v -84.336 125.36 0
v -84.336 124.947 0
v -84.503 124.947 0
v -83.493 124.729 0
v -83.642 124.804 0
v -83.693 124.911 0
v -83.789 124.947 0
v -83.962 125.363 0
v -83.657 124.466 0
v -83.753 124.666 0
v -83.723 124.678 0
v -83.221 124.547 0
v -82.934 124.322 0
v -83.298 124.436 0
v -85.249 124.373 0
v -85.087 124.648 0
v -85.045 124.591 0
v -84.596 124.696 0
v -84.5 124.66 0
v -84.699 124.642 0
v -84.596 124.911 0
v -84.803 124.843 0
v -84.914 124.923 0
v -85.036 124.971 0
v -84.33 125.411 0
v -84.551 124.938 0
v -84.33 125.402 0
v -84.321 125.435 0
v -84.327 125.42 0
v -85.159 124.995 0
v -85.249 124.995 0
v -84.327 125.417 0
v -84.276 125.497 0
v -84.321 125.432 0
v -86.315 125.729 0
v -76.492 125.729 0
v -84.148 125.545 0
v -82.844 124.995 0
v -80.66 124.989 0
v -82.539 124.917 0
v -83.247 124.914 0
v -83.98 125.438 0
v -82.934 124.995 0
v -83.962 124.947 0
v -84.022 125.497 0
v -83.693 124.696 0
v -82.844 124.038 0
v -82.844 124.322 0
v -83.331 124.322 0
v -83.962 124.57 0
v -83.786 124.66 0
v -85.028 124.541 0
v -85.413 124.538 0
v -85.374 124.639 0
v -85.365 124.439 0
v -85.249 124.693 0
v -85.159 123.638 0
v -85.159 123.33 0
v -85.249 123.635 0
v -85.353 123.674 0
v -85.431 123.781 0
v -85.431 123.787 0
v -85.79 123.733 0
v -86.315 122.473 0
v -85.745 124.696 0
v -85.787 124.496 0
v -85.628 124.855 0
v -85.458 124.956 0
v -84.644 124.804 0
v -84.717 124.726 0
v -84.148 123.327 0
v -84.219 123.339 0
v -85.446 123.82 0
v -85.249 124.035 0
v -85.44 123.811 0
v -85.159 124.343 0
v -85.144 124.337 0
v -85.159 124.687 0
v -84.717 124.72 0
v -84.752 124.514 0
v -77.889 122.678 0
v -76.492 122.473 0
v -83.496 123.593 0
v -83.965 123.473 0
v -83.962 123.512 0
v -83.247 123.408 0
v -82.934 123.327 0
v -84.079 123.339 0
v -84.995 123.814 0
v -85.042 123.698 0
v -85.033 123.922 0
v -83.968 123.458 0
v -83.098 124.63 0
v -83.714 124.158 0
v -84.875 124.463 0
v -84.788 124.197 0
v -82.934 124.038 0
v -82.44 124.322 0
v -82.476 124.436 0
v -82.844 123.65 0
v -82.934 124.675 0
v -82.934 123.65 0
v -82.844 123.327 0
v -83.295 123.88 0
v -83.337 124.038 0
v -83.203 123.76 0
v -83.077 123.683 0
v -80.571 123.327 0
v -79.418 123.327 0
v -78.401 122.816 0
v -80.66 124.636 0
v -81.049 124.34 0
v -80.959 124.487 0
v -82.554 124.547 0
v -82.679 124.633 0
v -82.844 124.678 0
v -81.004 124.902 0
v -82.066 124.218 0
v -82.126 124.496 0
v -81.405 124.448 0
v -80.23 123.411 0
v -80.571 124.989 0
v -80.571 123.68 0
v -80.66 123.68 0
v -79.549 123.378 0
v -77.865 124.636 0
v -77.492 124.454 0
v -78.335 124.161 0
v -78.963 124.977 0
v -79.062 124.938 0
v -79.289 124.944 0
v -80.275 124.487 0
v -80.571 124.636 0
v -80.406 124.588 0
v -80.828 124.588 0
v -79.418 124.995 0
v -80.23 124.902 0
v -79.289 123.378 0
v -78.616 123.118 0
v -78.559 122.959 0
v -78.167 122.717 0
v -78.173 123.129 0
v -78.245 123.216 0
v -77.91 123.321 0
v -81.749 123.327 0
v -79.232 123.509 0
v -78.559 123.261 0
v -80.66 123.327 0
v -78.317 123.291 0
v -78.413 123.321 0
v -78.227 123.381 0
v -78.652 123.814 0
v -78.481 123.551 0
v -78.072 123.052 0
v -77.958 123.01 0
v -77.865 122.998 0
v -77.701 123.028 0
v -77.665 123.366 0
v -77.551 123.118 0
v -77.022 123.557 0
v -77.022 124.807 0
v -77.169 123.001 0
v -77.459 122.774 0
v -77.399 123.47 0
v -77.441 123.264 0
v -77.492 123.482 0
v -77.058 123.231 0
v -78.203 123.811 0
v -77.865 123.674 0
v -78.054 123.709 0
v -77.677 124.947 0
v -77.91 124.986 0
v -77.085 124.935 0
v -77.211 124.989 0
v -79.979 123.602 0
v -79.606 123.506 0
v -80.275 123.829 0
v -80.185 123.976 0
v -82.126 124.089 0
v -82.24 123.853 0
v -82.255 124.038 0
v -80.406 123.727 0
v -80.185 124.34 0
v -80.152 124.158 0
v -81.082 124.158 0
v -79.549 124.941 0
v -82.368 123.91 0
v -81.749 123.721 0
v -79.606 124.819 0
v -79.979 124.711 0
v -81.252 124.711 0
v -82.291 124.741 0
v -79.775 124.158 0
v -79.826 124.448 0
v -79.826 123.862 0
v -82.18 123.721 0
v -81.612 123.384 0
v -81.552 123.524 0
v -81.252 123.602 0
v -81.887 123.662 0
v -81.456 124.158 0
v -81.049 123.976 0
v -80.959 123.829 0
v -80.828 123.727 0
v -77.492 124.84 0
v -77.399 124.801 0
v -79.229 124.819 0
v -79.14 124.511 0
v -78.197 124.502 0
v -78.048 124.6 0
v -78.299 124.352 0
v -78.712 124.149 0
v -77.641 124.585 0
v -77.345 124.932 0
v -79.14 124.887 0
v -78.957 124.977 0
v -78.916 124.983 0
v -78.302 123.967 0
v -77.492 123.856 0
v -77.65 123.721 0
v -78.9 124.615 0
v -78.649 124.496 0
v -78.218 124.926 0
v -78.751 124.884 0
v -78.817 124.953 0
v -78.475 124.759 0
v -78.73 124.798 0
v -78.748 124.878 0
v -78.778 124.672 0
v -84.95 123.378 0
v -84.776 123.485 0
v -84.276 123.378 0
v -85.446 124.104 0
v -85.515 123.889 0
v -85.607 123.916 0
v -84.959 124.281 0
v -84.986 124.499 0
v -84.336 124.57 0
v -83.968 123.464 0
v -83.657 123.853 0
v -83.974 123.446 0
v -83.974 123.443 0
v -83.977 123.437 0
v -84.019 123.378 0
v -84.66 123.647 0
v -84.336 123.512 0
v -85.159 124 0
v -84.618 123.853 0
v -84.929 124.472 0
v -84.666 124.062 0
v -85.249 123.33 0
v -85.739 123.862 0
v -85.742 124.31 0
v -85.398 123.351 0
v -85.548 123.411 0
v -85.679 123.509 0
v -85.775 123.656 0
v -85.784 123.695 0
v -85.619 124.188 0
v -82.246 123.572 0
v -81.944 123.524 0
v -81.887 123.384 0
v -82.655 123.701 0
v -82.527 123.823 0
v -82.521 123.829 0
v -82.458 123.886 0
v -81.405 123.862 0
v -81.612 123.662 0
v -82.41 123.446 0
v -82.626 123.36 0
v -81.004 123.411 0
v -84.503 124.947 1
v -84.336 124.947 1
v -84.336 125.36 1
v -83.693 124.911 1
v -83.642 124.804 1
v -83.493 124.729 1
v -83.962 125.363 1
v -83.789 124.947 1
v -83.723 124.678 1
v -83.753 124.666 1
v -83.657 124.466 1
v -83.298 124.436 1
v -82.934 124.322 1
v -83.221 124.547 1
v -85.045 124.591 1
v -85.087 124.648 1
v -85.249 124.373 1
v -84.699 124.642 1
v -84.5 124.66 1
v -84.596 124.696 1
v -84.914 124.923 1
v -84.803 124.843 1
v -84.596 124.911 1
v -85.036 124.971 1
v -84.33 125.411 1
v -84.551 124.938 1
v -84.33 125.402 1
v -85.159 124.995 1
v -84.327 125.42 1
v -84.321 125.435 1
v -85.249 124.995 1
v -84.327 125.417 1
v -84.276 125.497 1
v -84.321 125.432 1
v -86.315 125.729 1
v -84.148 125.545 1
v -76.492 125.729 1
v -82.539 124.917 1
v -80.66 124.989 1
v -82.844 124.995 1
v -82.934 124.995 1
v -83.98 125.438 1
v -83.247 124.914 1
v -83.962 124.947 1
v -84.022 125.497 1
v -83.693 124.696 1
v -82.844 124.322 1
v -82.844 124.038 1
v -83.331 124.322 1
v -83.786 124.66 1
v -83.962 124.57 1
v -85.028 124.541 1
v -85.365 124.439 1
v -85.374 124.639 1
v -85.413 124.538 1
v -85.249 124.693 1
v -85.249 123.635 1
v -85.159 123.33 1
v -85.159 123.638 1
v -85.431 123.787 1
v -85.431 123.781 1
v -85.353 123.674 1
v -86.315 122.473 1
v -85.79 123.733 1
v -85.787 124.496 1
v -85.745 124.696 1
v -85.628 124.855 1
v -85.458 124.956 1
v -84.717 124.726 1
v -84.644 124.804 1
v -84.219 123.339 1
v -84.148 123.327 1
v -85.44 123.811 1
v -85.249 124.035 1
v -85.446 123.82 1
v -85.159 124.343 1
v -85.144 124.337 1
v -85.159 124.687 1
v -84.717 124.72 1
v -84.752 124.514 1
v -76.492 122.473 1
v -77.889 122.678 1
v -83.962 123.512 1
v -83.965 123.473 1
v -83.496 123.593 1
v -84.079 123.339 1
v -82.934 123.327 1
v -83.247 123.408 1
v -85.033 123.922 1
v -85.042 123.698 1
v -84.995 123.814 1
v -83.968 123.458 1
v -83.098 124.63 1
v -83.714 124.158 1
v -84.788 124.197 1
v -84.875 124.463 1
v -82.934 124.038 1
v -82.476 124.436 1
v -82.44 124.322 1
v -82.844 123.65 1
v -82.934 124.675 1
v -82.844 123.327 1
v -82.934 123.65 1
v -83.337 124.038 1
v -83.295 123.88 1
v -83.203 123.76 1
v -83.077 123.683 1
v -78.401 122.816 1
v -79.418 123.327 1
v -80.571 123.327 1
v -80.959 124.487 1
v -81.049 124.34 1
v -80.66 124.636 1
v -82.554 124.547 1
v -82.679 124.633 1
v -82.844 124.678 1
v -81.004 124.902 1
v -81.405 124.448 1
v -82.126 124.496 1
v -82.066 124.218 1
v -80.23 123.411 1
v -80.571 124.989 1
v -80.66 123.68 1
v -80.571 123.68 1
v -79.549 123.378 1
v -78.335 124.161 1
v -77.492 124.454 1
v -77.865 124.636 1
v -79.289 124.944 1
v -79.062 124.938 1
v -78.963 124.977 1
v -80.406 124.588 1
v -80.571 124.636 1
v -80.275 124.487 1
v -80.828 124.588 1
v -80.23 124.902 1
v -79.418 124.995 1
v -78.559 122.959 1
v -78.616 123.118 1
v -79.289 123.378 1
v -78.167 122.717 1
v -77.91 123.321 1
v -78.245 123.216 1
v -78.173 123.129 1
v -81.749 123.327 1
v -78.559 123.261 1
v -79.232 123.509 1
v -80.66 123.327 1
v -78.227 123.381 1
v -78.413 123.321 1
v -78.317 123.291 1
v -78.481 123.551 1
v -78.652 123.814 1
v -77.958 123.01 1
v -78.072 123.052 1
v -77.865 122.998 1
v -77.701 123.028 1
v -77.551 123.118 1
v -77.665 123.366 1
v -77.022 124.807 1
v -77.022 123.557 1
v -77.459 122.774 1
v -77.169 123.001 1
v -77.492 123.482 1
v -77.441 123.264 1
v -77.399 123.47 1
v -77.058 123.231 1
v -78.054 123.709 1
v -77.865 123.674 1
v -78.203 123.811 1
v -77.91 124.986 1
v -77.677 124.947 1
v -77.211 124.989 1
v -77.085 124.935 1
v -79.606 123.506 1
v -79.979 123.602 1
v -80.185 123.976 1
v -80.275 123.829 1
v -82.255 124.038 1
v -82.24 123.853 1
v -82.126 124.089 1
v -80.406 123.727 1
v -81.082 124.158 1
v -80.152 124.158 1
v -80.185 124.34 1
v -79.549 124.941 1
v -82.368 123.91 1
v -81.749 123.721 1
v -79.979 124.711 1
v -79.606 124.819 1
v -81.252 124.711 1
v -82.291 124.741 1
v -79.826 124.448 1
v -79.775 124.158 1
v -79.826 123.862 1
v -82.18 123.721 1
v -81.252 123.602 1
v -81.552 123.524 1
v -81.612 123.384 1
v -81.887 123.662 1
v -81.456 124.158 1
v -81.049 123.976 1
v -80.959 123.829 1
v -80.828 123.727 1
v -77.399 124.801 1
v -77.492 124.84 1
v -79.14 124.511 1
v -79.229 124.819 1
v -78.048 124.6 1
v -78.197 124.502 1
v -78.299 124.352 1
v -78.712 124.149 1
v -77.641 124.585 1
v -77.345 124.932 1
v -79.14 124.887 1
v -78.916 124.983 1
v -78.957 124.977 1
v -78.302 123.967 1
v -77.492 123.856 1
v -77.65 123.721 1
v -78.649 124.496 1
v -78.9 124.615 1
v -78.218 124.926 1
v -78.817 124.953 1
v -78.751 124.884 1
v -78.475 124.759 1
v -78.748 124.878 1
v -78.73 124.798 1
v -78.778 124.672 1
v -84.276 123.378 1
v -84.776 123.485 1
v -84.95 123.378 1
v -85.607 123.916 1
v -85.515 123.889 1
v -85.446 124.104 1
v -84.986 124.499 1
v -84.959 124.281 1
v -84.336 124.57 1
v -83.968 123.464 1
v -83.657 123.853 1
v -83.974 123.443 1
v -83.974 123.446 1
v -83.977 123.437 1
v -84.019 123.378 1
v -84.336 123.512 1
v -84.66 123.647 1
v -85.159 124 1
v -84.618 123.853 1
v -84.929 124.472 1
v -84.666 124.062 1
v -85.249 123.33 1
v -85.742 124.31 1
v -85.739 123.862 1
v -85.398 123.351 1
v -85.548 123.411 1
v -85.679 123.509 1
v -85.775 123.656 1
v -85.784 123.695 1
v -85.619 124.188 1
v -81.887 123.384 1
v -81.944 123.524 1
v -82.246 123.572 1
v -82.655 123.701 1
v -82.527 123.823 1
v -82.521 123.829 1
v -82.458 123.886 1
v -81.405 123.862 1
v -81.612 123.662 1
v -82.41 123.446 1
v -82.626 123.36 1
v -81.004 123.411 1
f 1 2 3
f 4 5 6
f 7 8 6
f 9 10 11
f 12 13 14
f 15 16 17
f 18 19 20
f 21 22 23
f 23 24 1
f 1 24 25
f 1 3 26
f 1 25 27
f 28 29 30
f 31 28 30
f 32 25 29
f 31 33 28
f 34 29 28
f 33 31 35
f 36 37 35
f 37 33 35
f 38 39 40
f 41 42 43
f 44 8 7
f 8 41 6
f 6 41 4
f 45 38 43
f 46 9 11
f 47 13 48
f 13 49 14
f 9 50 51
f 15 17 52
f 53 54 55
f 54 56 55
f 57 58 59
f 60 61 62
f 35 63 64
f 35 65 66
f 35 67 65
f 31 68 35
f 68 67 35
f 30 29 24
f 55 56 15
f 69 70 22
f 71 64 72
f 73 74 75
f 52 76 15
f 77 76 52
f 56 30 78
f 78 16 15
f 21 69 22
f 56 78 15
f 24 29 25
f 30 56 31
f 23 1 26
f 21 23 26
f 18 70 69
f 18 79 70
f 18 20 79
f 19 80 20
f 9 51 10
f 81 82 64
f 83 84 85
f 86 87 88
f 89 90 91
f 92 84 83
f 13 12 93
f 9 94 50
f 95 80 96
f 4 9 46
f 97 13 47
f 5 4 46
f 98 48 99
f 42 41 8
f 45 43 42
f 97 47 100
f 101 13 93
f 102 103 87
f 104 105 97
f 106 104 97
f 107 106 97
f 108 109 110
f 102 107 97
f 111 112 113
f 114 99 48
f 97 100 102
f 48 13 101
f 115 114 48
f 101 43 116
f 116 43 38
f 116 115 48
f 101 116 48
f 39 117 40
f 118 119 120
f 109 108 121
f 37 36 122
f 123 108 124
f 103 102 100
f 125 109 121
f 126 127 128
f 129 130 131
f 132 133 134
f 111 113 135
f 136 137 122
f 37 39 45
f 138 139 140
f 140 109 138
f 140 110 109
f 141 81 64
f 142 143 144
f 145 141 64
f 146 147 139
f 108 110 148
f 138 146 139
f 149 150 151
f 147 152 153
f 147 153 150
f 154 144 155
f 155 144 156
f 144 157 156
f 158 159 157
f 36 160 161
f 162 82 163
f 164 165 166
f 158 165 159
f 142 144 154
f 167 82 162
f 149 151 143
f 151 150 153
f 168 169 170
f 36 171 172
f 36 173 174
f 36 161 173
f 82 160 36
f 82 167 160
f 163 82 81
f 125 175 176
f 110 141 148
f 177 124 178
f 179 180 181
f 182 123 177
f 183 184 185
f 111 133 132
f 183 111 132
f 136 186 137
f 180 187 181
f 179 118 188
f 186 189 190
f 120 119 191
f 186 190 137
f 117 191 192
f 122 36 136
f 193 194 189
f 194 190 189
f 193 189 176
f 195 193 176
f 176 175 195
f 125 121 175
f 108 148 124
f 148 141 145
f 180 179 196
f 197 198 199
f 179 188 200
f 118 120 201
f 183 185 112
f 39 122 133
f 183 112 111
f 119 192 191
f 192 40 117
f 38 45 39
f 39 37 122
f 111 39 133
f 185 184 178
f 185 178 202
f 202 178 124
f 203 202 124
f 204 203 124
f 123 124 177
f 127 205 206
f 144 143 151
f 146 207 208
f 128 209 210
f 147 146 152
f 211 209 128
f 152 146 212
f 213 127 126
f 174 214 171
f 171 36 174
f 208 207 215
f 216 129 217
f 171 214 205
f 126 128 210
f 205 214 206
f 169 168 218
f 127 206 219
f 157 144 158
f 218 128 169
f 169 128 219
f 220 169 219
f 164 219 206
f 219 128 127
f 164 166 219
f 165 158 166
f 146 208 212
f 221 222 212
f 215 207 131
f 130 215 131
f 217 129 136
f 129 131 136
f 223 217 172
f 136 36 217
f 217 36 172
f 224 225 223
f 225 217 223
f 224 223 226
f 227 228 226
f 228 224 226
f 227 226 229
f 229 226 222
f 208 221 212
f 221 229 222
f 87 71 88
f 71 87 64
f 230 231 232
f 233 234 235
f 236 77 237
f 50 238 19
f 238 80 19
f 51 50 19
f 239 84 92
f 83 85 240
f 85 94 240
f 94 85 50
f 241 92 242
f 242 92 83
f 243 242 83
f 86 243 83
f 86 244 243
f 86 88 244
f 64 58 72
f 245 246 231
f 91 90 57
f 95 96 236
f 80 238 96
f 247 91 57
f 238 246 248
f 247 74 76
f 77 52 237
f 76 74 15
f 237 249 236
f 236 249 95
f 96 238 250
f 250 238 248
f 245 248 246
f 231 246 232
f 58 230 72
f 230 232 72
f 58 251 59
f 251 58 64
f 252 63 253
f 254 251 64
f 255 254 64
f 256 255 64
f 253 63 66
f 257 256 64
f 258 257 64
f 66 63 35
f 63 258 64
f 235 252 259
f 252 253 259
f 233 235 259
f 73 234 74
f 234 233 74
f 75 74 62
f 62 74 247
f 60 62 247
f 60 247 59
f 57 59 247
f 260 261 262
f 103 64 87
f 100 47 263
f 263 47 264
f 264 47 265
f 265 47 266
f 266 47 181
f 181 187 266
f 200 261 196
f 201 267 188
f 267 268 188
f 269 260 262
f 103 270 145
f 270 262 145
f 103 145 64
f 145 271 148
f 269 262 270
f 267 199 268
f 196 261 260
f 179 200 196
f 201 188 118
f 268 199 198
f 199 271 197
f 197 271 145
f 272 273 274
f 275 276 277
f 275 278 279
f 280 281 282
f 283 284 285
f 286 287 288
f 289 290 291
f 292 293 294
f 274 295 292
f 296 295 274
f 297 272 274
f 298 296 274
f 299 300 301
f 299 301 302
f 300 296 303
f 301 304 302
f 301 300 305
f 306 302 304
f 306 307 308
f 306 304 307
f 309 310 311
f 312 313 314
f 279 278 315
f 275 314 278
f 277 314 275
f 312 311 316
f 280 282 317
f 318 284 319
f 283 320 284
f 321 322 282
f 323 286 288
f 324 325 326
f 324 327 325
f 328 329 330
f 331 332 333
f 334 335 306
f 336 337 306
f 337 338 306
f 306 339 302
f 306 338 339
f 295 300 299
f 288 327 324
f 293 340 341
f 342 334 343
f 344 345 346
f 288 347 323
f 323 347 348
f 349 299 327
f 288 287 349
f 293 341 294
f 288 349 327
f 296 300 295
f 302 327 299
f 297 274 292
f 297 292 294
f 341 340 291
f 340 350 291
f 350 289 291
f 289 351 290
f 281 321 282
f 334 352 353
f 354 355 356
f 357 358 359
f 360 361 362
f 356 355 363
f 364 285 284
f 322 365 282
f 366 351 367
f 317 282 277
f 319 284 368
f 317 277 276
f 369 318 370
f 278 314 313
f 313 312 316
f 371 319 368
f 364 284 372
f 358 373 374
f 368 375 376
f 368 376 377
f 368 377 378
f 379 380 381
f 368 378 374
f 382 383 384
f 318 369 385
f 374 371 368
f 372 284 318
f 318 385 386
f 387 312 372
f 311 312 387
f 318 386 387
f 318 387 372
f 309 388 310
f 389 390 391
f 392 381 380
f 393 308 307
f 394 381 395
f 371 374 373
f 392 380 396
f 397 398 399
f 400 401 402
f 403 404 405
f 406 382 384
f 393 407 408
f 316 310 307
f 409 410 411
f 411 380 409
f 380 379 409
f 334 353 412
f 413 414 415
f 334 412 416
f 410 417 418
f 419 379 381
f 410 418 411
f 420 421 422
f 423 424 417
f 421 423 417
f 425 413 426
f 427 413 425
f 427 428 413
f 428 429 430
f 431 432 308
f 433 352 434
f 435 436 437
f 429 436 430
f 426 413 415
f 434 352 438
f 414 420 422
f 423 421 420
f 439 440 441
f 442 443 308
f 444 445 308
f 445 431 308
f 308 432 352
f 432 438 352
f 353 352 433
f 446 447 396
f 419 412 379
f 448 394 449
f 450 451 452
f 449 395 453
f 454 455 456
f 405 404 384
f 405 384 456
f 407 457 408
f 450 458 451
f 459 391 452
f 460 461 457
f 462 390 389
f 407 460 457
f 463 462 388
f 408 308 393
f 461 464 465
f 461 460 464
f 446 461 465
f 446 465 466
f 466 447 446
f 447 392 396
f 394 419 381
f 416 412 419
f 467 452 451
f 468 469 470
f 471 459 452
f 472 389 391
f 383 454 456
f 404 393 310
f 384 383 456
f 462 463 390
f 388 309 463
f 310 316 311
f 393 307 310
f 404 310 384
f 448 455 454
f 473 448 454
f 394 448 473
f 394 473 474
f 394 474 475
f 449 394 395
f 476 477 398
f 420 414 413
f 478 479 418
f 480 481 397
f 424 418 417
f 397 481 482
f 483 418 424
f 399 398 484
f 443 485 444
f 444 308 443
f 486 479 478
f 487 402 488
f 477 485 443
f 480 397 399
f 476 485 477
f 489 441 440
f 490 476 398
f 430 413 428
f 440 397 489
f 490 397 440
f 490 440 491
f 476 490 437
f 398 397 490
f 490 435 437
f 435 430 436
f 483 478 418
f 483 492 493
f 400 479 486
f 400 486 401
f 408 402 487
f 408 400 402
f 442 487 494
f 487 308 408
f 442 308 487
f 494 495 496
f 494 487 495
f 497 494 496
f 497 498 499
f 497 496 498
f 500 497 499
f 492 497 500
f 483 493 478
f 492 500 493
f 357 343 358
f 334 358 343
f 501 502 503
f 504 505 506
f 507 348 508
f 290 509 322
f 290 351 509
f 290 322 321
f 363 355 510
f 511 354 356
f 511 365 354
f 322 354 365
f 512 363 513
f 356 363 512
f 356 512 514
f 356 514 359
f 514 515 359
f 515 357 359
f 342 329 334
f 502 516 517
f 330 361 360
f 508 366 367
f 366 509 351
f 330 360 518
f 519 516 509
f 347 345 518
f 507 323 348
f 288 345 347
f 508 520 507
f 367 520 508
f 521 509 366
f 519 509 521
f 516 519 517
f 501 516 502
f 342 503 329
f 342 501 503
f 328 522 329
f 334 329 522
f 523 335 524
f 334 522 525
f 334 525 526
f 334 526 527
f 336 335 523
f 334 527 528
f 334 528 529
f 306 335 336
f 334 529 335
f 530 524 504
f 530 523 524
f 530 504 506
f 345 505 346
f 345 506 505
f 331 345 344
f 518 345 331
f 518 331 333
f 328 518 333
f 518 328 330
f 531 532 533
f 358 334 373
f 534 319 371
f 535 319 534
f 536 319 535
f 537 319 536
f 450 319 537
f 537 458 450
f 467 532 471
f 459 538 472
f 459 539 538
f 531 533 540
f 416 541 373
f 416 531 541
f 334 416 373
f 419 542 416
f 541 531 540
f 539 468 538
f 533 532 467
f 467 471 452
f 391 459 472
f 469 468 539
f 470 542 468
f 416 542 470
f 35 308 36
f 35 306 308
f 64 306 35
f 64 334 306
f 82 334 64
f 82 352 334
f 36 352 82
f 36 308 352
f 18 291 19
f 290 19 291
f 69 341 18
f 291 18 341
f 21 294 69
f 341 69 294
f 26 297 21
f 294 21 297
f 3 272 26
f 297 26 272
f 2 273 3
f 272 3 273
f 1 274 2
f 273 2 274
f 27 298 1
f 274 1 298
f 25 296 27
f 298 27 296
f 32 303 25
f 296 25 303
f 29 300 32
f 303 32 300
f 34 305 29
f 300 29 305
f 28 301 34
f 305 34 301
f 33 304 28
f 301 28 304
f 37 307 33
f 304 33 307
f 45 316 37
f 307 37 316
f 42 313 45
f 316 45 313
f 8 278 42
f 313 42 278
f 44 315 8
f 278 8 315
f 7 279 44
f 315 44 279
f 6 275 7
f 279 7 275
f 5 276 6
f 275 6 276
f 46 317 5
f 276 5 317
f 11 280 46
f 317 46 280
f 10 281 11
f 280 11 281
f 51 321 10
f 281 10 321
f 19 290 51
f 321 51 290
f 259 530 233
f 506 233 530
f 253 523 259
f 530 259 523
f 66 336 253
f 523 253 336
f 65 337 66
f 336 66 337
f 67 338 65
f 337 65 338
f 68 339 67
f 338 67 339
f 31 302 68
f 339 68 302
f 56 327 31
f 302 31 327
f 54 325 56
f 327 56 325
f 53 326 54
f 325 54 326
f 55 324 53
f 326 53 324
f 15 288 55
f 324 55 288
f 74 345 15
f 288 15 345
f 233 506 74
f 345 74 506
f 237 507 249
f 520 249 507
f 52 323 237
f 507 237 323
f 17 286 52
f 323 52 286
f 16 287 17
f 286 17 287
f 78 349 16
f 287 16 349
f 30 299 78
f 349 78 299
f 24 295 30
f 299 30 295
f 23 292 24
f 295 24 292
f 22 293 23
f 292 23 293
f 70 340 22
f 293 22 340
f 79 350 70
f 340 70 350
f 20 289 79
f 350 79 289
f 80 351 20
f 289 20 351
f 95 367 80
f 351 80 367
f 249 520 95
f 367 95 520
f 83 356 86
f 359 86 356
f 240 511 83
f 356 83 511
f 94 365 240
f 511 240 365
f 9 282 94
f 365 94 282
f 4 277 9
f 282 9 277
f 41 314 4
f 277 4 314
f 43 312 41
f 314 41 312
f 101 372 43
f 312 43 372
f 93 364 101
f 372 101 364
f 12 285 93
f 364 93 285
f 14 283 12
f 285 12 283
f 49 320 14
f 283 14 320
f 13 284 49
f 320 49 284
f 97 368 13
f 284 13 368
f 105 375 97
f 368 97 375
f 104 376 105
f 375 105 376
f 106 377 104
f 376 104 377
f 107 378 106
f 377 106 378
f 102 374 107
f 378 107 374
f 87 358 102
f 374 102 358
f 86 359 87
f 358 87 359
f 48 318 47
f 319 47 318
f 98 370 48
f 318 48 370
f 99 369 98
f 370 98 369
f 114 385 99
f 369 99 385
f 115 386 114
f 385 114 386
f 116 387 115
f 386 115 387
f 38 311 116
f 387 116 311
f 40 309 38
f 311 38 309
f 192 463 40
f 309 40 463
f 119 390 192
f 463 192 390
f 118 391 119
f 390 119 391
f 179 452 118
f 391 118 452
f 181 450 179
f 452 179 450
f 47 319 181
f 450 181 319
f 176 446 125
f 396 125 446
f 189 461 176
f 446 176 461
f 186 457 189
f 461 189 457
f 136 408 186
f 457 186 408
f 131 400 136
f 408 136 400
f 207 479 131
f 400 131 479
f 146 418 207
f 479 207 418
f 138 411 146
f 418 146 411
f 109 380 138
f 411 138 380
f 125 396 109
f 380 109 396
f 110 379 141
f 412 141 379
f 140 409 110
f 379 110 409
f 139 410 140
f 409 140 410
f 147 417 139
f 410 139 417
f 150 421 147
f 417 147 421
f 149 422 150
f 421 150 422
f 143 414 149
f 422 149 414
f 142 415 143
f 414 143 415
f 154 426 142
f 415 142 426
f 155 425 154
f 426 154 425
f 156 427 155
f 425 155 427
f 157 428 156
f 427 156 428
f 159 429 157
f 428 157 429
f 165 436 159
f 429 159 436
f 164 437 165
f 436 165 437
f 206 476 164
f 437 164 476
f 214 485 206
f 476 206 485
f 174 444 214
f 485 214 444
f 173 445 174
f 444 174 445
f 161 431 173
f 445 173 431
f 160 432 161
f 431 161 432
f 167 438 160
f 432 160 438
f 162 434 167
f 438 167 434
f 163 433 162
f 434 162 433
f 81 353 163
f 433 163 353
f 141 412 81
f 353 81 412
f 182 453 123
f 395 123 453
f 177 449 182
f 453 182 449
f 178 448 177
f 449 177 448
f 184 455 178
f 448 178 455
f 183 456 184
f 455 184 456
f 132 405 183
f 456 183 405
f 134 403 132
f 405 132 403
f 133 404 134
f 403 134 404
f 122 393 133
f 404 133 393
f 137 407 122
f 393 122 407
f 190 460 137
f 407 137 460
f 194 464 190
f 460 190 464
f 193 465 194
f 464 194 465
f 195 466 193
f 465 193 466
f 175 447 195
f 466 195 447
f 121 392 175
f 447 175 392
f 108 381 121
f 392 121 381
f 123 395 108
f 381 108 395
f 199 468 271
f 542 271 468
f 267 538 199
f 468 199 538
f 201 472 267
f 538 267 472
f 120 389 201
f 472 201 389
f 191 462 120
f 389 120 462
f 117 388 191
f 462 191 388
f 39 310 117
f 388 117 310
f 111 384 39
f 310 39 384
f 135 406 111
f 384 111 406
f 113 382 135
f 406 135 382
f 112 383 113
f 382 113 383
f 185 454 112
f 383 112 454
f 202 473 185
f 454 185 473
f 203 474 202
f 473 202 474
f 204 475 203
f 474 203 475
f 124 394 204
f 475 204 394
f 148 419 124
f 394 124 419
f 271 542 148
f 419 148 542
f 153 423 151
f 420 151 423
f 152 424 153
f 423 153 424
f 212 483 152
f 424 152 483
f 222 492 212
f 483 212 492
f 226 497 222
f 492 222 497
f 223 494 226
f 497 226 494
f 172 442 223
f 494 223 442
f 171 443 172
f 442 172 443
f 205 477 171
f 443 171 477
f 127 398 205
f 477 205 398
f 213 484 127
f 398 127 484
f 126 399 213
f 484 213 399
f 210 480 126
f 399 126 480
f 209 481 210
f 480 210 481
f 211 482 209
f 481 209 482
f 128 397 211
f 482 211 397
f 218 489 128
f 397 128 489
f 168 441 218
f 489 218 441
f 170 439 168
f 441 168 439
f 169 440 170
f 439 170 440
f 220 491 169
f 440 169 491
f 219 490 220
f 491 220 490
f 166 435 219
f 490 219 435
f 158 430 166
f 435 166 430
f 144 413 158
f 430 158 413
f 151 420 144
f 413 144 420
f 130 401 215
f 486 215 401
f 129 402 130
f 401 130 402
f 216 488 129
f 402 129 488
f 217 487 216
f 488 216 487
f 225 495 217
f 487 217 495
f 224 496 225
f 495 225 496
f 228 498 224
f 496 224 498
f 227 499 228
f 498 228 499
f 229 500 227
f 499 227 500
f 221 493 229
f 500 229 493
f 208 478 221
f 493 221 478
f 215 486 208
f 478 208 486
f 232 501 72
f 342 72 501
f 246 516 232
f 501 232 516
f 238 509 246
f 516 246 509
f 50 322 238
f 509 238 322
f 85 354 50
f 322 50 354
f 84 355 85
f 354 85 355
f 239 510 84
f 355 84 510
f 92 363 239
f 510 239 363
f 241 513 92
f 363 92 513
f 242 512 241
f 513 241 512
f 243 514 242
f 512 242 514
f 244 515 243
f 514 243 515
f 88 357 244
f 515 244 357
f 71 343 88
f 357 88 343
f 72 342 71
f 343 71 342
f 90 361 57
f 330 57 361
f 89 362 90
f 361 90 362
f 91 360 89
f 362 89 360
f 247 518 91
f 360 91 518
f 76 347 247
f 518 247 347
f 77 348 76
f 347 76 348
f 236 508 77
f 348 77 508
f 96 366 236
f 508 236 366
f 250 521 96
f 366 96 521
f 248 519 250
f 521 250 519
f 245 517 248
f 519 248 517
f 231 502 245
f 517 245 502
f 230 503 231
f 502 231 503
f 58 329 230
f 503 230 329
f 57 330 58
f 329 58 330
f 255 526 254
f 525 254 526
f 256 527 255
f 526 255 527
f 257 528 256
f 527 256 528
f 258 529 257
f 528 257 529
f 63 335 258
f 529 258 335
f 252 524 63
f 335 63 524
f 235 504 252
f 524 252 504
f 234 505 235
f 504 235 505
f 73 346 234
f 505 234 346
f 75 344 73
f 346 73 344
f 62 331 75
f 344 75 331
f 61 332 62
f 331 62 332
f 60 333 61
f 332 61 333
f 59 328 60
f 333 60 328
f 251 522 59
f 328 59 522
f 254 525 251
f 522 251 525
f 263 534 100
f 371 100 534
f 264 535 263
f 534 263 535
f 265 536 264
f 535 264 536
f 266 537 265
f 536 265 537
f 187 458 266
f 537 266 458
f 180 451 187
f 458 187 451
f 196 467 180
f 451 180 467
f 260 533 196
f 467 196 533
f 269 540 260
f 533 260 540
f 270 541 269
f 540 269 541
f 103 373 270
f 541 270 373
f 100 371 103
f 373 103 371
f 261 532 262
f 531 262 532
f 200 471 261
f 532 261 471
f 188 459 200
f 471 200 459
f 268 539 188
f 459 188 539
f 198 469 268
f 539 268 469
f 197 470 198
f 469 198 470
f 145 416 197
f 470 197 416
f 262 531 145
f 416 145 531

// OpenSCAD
linear_extrude(height=1) rect86();

module rect86()
    polygon(
        points=
            [[-86.315, 125.729], [-86.315, 122.473], [-76.492, 122.473], [-76.492, 125.729], [-84.148, 125.545], [-84.022, 125.497], [-83.98, 125.438], [-83.962, 125.363], [-83.962, 124.947], [-83.789, 124.947], [-83.693, 124.911], [-83.642, 124.804], [-83.693, 124.696], [-83.723, 124.678], [-83.753, 124.666], [-83.786, 124.66], [-83.962, 124.66], [-84.336, 124.66], [-84.5, 124.66], [-84.596, 124.696], [-84.644, 124.804], [-84.596, 124.911], [-84.551, 124.938], [-84.503, 124.947], [-84.336, 124.947], [-84.336, 125.36], [-84.33, 125.402], [-84.33, 125.411], [-84.327, 125.417], [-84.327, 125.42], [-84.324, 125.426], [-84.321, 125.432], [-84.321, 125.435], [-84.276, 125.497], [-84.148, 125.545], [-85.249, 124.995], [-85.249, 124.693], [-85.374, 124.639], [-85.413, 124.538], [-85.365, 124.439], [-85.249, 124.373], [-85.249, 124.035], [-85.446, 124.104], [-85.619, 124.188], [-85.742, 124.31], [-85.787, 124.496], [-85.745, 124.696], [-85.628, 124.855], [-85.458, 124.956], [-85.249, 124.995], [-85.159, 124.995], [-85.036, 124.971], [-84.914, 124.923], [-84.803, 124.843], [-84.717, 124.726], [-84.717, 124.72], [-84.699, 124.642], [-84.752, 124.514], [-84.875, 124.463], [-84.929, 124.472], [-84.986, 124.499], [-85.028, 124.541], [-85.045, 124.591], [-85.087, 124.648], [-85.159, 124.687], [-82.934, 124.995], [-82.934, 124.675], [-83.098, 124.63], [-83.221, 124.547], [-83.298, 124.436], [-83.331, 124.322], [-82.934, 124.322], [-82.934, 124.038], [-83.337, 124.038], [-83.295, 123.88], [-83.203, 123.76], [-83.077, 123.683], [-82.934, 123.65], [-82.934, 123.327], [-83.247, 123.408], [-83.496, 123.593], [-83.657, 123.853], [-83.714, 124.158], [-83.657, 124.466], [-83.493, 124.729], [-83.247, 124.914], [-82.844, 124.995], [-82.539, 124.917], [-82.291, 124.741], [-82.126, 124.496], [-82.066, 124.218], [-82.126, 124.089], [-82.255, 124.038], [-82.844, 124.038], [-82.844, 124.322], [-82.44, 124.322], [-82.476, 124.436], [-82.554, 124.547], [-82.679, 124.633], [-82.844, 124.678], [-79.418, 124.995], [-79.289, 124.944], [-79.229, 124.819], [-79.232, 123.509], [-79.289, 123.378], [-79.418, 123.327], [-79.549, 123.378], [-79.606, 123.506], [-79.606, 124.819], [-79.549, 124.941], [-79.418, 124.995], [-80.66, 124.989], [-80.66, 124.636], [-80.828, 124.588], [-80.959, 124.487], [-81.049, 124.34], [-81.082, 124.158], [-81.049, 123.976], [-80.959, 123.829], [-80.828, 123.727], [-80.66, 123.68], [-80.66, 123.327], [-81.004, 123.411], [-81.252, 123.602], [-81.405, 123.862], [-81.456, 124.158], [-81.405, 124.448], [-81.252, 124.711], [-81.004, 124.902], [-80.571, 124.989], [-80.23, 124.902], [-79.979, 124.711], [-79.826, 124.448], [-79.775, 124.158], [-79.826, 123.862], [-79.979, 123.602], [-80.23, 123.411], [-80.571, 123.327], [-80.571, 123.68], [-80.406, 123.727], [-80.275, 123.829], [-80.185, 123.976], [-80.152, 124.158], [-80.185, 124.34], [-80.275, 124.487], [-80.406, 124.588], [-80.571, 124.636], [-77.211, 124.989], [-77.085, 124.935], [-77.022, 124.807], [-77.022, 123.557], [-77.058, 123.231], [-77.169, 123.001], [-77.459, 122.774], [-77.889, 122.678], [-78.167, 122.717], [-78.401, 122.816], [-78.559, 122.959], [-78.616, 123.118], [-78.559, 123.261], [-78.413, 123.321], [-78.317, 123.291], [-78.245, 123.216], [-78.173, 123.129], [-78.072, 123.052], [-77.958, 123.01], [-77.865, 122.998], [-77.701, 123.028], [-77.551, 123.118], [-77.441, 123.264], [-77.399, 123.47], [-77.399, 124.801], [-77.345, 124.932], [-77.211, 124.989], [-77.91, 124.986], [-77.677, 124.947], [-77.492, 124.84], [-77.492, 124.454], [-77.641, 124.585], [-77.865, 124.636], [-78.048, 124.6], [-78.197, 124.502], [-78.299, 124.352], [-78.335, 124.161], [-78.302, 123.967], [-78.203, 123.811], [-78.054, 123.709], [-77.865, 123.674], [-77.65, 123.721], [-77.492, 123.856], [-77.492, 123.482], [-77.665, 123.366], [-77.91, 123.321], [-78.227, 123.381], [-78.481, 123.551], [-78.652, 123.814], [-78.712, 124.149], [-78.649, 124.496], [-78.475, 124.759], [-78.218, 124.926], [-77.91, 124.986], [-78.916, 124.983], [-78.817, 124.953], [-78.751, 124.884], [-78.748, 124.878], [-78.73, 124.798], [-78.778, 124.672], [-78.9, 124.615], [-79.14, 124.511], [-79.14, 124.887], [-79.062, 124.938], [-78.963, 124.977], [-78.957, 124.977], [-78.916, 124.983], [-84.336, 124.57], [-83.962, 124.57], [-83.962, 123.512], [-83.965, 123.473], [-83.968, 123.464], [-83.968, 123.458], [-83.971, 123.452], [-83.974, 123.446], [-83.974, 123.443], [-83.977, 123.437], [-84.019, 123.378], [-84.079, 123.339], [-84.148, 123.327], [-84.219, 123.339], [-84.276, 123.378], [-84.336, 123.512], [-85.159, 124.343], [-85.144, 124.337], [-84.959, 124.281], [-84.788, 124.197], [-84.666, 124.062], [-84.618, 123.853], [-84.66, 123.647], [-84.776, 123.485], [-84.95, 123.378], [-85.159, 123.33], [-85.159, 123.638], [-85.042, 123.698], [-84.995, 123.814], [-85.033, 123.922], [-85.159, 124.0], [-85.607, 123.916], [-85.515, 123.889], [-85.446, 123.82], [-85.44, 123.811], [-85.431, 123.787], [-85.431, 123.781], [-85.353, 123.674], [-85.249, 123.635], [-85.249, 123.33], [-85.398, 123.351], [-85.548, 123.411], [-85.679, 123.509], [-85.775, 123.656], [-85.784, 123.695], [-85.79, 123.733], [-85.739, 123.862], [-85.607, 123.916], [-82.368, 123.91], [-82.24, 123.853], [-82.18, 123.721], [-82.246, 123.572], [-82.41, 123.446], [-82.626, 123.36], [-82.844, 123.327], [-82.844, 123.65], [-82.655, 123.701], [-82.527, 123.823], [-82.521, 123.829], [-82.458, 123.886], [-82.368, 123.91], [-81.749, 123.721], [-81.612, 123.662], [-81.552, 123.524], [-81.612, 123.384], [-81.749, 123.327], [-81.887, 123.384], [-81.944, 123.524], [-81.887, 123.662]],
        paths=
            [[0, 1, 2, 3, 0], [4, 5, 6, 7, 8, 9, 10, 11, 12, 13, 14, 15, 16, 17, 18, 19, 20, 21, 22, 23, 24, 25, 26, 27, 28, 29, 30, 31, 32, 33, 34, 4], [35, 36, 37, 38, 39, 40, 41, 42, 43, 44, 45, 46, 47, 48, 49, 35], [50, 51, 52, 53, 54, 55, 56, 57, 58, 59, 60, 61, 62, 63, 64, 50], [65, 66, 67, 68, 69, 70, 71, 72, 73, 74, 75, 76, 77, 78, 79, 80, 81, 82, 83, 84, 85, 65, 65], [86, 87, 88, 89, 90, 91, 92, 93, 94, 95, 96, 97, 98, 99, 86], [100, 101, 102, 103, 104, 105, 106, 107, 108, 109, 110, 100], [111, 112, 113, 114, 115, 116, 117, 118, 119, 120, 121, 122, 123, 124, 125, 126, 127, 128, 111, 111], [129, 130, 131, 132, 133, 134, 135, 136, 137, 138, 139, 140, 141, 142, 143, 144, 145, 146, 129], [147, 148, 149, 150, 151, 152, 153, 154, 155, 156, 157, 158, 159, 160, 161, 162, 163, 164, 165, 166, 167, 168, 169, 170, 171, 172, 173, 147], [174, 175, 176, 177, 178, 179, 180, 181, 182, 183, 184, 185, 186, 187, 188, 189, 190, 191, 192, 193, 194, 195, 196, 197, 198, 199, 200, 174], [201, 202, 203, 204, 205, 206, 207, 208, 209, 210, 211, 212, 213, 201], [214, 215, 216, 217, 218, 219, 220, 221, 222, 223, 224, 225, 226, 227, 228, 229, 214], [230, 231, 232, 233, 234, 235, 236, 237, 238, 239, 240, 241, 242, 243, 244, 230], [245, 246, 247, 248, 249, 250, 251, 252, 253, 254, 255, 256, 257, 258, 259, 260, 261, 245], [262, 263, 264, 265, 266, 267, 268, 269, 270, 271, 272, 273, 274, 262], [275, 276, 277, 278, 279, 280, 281, 282, 275, 275]]
    );
